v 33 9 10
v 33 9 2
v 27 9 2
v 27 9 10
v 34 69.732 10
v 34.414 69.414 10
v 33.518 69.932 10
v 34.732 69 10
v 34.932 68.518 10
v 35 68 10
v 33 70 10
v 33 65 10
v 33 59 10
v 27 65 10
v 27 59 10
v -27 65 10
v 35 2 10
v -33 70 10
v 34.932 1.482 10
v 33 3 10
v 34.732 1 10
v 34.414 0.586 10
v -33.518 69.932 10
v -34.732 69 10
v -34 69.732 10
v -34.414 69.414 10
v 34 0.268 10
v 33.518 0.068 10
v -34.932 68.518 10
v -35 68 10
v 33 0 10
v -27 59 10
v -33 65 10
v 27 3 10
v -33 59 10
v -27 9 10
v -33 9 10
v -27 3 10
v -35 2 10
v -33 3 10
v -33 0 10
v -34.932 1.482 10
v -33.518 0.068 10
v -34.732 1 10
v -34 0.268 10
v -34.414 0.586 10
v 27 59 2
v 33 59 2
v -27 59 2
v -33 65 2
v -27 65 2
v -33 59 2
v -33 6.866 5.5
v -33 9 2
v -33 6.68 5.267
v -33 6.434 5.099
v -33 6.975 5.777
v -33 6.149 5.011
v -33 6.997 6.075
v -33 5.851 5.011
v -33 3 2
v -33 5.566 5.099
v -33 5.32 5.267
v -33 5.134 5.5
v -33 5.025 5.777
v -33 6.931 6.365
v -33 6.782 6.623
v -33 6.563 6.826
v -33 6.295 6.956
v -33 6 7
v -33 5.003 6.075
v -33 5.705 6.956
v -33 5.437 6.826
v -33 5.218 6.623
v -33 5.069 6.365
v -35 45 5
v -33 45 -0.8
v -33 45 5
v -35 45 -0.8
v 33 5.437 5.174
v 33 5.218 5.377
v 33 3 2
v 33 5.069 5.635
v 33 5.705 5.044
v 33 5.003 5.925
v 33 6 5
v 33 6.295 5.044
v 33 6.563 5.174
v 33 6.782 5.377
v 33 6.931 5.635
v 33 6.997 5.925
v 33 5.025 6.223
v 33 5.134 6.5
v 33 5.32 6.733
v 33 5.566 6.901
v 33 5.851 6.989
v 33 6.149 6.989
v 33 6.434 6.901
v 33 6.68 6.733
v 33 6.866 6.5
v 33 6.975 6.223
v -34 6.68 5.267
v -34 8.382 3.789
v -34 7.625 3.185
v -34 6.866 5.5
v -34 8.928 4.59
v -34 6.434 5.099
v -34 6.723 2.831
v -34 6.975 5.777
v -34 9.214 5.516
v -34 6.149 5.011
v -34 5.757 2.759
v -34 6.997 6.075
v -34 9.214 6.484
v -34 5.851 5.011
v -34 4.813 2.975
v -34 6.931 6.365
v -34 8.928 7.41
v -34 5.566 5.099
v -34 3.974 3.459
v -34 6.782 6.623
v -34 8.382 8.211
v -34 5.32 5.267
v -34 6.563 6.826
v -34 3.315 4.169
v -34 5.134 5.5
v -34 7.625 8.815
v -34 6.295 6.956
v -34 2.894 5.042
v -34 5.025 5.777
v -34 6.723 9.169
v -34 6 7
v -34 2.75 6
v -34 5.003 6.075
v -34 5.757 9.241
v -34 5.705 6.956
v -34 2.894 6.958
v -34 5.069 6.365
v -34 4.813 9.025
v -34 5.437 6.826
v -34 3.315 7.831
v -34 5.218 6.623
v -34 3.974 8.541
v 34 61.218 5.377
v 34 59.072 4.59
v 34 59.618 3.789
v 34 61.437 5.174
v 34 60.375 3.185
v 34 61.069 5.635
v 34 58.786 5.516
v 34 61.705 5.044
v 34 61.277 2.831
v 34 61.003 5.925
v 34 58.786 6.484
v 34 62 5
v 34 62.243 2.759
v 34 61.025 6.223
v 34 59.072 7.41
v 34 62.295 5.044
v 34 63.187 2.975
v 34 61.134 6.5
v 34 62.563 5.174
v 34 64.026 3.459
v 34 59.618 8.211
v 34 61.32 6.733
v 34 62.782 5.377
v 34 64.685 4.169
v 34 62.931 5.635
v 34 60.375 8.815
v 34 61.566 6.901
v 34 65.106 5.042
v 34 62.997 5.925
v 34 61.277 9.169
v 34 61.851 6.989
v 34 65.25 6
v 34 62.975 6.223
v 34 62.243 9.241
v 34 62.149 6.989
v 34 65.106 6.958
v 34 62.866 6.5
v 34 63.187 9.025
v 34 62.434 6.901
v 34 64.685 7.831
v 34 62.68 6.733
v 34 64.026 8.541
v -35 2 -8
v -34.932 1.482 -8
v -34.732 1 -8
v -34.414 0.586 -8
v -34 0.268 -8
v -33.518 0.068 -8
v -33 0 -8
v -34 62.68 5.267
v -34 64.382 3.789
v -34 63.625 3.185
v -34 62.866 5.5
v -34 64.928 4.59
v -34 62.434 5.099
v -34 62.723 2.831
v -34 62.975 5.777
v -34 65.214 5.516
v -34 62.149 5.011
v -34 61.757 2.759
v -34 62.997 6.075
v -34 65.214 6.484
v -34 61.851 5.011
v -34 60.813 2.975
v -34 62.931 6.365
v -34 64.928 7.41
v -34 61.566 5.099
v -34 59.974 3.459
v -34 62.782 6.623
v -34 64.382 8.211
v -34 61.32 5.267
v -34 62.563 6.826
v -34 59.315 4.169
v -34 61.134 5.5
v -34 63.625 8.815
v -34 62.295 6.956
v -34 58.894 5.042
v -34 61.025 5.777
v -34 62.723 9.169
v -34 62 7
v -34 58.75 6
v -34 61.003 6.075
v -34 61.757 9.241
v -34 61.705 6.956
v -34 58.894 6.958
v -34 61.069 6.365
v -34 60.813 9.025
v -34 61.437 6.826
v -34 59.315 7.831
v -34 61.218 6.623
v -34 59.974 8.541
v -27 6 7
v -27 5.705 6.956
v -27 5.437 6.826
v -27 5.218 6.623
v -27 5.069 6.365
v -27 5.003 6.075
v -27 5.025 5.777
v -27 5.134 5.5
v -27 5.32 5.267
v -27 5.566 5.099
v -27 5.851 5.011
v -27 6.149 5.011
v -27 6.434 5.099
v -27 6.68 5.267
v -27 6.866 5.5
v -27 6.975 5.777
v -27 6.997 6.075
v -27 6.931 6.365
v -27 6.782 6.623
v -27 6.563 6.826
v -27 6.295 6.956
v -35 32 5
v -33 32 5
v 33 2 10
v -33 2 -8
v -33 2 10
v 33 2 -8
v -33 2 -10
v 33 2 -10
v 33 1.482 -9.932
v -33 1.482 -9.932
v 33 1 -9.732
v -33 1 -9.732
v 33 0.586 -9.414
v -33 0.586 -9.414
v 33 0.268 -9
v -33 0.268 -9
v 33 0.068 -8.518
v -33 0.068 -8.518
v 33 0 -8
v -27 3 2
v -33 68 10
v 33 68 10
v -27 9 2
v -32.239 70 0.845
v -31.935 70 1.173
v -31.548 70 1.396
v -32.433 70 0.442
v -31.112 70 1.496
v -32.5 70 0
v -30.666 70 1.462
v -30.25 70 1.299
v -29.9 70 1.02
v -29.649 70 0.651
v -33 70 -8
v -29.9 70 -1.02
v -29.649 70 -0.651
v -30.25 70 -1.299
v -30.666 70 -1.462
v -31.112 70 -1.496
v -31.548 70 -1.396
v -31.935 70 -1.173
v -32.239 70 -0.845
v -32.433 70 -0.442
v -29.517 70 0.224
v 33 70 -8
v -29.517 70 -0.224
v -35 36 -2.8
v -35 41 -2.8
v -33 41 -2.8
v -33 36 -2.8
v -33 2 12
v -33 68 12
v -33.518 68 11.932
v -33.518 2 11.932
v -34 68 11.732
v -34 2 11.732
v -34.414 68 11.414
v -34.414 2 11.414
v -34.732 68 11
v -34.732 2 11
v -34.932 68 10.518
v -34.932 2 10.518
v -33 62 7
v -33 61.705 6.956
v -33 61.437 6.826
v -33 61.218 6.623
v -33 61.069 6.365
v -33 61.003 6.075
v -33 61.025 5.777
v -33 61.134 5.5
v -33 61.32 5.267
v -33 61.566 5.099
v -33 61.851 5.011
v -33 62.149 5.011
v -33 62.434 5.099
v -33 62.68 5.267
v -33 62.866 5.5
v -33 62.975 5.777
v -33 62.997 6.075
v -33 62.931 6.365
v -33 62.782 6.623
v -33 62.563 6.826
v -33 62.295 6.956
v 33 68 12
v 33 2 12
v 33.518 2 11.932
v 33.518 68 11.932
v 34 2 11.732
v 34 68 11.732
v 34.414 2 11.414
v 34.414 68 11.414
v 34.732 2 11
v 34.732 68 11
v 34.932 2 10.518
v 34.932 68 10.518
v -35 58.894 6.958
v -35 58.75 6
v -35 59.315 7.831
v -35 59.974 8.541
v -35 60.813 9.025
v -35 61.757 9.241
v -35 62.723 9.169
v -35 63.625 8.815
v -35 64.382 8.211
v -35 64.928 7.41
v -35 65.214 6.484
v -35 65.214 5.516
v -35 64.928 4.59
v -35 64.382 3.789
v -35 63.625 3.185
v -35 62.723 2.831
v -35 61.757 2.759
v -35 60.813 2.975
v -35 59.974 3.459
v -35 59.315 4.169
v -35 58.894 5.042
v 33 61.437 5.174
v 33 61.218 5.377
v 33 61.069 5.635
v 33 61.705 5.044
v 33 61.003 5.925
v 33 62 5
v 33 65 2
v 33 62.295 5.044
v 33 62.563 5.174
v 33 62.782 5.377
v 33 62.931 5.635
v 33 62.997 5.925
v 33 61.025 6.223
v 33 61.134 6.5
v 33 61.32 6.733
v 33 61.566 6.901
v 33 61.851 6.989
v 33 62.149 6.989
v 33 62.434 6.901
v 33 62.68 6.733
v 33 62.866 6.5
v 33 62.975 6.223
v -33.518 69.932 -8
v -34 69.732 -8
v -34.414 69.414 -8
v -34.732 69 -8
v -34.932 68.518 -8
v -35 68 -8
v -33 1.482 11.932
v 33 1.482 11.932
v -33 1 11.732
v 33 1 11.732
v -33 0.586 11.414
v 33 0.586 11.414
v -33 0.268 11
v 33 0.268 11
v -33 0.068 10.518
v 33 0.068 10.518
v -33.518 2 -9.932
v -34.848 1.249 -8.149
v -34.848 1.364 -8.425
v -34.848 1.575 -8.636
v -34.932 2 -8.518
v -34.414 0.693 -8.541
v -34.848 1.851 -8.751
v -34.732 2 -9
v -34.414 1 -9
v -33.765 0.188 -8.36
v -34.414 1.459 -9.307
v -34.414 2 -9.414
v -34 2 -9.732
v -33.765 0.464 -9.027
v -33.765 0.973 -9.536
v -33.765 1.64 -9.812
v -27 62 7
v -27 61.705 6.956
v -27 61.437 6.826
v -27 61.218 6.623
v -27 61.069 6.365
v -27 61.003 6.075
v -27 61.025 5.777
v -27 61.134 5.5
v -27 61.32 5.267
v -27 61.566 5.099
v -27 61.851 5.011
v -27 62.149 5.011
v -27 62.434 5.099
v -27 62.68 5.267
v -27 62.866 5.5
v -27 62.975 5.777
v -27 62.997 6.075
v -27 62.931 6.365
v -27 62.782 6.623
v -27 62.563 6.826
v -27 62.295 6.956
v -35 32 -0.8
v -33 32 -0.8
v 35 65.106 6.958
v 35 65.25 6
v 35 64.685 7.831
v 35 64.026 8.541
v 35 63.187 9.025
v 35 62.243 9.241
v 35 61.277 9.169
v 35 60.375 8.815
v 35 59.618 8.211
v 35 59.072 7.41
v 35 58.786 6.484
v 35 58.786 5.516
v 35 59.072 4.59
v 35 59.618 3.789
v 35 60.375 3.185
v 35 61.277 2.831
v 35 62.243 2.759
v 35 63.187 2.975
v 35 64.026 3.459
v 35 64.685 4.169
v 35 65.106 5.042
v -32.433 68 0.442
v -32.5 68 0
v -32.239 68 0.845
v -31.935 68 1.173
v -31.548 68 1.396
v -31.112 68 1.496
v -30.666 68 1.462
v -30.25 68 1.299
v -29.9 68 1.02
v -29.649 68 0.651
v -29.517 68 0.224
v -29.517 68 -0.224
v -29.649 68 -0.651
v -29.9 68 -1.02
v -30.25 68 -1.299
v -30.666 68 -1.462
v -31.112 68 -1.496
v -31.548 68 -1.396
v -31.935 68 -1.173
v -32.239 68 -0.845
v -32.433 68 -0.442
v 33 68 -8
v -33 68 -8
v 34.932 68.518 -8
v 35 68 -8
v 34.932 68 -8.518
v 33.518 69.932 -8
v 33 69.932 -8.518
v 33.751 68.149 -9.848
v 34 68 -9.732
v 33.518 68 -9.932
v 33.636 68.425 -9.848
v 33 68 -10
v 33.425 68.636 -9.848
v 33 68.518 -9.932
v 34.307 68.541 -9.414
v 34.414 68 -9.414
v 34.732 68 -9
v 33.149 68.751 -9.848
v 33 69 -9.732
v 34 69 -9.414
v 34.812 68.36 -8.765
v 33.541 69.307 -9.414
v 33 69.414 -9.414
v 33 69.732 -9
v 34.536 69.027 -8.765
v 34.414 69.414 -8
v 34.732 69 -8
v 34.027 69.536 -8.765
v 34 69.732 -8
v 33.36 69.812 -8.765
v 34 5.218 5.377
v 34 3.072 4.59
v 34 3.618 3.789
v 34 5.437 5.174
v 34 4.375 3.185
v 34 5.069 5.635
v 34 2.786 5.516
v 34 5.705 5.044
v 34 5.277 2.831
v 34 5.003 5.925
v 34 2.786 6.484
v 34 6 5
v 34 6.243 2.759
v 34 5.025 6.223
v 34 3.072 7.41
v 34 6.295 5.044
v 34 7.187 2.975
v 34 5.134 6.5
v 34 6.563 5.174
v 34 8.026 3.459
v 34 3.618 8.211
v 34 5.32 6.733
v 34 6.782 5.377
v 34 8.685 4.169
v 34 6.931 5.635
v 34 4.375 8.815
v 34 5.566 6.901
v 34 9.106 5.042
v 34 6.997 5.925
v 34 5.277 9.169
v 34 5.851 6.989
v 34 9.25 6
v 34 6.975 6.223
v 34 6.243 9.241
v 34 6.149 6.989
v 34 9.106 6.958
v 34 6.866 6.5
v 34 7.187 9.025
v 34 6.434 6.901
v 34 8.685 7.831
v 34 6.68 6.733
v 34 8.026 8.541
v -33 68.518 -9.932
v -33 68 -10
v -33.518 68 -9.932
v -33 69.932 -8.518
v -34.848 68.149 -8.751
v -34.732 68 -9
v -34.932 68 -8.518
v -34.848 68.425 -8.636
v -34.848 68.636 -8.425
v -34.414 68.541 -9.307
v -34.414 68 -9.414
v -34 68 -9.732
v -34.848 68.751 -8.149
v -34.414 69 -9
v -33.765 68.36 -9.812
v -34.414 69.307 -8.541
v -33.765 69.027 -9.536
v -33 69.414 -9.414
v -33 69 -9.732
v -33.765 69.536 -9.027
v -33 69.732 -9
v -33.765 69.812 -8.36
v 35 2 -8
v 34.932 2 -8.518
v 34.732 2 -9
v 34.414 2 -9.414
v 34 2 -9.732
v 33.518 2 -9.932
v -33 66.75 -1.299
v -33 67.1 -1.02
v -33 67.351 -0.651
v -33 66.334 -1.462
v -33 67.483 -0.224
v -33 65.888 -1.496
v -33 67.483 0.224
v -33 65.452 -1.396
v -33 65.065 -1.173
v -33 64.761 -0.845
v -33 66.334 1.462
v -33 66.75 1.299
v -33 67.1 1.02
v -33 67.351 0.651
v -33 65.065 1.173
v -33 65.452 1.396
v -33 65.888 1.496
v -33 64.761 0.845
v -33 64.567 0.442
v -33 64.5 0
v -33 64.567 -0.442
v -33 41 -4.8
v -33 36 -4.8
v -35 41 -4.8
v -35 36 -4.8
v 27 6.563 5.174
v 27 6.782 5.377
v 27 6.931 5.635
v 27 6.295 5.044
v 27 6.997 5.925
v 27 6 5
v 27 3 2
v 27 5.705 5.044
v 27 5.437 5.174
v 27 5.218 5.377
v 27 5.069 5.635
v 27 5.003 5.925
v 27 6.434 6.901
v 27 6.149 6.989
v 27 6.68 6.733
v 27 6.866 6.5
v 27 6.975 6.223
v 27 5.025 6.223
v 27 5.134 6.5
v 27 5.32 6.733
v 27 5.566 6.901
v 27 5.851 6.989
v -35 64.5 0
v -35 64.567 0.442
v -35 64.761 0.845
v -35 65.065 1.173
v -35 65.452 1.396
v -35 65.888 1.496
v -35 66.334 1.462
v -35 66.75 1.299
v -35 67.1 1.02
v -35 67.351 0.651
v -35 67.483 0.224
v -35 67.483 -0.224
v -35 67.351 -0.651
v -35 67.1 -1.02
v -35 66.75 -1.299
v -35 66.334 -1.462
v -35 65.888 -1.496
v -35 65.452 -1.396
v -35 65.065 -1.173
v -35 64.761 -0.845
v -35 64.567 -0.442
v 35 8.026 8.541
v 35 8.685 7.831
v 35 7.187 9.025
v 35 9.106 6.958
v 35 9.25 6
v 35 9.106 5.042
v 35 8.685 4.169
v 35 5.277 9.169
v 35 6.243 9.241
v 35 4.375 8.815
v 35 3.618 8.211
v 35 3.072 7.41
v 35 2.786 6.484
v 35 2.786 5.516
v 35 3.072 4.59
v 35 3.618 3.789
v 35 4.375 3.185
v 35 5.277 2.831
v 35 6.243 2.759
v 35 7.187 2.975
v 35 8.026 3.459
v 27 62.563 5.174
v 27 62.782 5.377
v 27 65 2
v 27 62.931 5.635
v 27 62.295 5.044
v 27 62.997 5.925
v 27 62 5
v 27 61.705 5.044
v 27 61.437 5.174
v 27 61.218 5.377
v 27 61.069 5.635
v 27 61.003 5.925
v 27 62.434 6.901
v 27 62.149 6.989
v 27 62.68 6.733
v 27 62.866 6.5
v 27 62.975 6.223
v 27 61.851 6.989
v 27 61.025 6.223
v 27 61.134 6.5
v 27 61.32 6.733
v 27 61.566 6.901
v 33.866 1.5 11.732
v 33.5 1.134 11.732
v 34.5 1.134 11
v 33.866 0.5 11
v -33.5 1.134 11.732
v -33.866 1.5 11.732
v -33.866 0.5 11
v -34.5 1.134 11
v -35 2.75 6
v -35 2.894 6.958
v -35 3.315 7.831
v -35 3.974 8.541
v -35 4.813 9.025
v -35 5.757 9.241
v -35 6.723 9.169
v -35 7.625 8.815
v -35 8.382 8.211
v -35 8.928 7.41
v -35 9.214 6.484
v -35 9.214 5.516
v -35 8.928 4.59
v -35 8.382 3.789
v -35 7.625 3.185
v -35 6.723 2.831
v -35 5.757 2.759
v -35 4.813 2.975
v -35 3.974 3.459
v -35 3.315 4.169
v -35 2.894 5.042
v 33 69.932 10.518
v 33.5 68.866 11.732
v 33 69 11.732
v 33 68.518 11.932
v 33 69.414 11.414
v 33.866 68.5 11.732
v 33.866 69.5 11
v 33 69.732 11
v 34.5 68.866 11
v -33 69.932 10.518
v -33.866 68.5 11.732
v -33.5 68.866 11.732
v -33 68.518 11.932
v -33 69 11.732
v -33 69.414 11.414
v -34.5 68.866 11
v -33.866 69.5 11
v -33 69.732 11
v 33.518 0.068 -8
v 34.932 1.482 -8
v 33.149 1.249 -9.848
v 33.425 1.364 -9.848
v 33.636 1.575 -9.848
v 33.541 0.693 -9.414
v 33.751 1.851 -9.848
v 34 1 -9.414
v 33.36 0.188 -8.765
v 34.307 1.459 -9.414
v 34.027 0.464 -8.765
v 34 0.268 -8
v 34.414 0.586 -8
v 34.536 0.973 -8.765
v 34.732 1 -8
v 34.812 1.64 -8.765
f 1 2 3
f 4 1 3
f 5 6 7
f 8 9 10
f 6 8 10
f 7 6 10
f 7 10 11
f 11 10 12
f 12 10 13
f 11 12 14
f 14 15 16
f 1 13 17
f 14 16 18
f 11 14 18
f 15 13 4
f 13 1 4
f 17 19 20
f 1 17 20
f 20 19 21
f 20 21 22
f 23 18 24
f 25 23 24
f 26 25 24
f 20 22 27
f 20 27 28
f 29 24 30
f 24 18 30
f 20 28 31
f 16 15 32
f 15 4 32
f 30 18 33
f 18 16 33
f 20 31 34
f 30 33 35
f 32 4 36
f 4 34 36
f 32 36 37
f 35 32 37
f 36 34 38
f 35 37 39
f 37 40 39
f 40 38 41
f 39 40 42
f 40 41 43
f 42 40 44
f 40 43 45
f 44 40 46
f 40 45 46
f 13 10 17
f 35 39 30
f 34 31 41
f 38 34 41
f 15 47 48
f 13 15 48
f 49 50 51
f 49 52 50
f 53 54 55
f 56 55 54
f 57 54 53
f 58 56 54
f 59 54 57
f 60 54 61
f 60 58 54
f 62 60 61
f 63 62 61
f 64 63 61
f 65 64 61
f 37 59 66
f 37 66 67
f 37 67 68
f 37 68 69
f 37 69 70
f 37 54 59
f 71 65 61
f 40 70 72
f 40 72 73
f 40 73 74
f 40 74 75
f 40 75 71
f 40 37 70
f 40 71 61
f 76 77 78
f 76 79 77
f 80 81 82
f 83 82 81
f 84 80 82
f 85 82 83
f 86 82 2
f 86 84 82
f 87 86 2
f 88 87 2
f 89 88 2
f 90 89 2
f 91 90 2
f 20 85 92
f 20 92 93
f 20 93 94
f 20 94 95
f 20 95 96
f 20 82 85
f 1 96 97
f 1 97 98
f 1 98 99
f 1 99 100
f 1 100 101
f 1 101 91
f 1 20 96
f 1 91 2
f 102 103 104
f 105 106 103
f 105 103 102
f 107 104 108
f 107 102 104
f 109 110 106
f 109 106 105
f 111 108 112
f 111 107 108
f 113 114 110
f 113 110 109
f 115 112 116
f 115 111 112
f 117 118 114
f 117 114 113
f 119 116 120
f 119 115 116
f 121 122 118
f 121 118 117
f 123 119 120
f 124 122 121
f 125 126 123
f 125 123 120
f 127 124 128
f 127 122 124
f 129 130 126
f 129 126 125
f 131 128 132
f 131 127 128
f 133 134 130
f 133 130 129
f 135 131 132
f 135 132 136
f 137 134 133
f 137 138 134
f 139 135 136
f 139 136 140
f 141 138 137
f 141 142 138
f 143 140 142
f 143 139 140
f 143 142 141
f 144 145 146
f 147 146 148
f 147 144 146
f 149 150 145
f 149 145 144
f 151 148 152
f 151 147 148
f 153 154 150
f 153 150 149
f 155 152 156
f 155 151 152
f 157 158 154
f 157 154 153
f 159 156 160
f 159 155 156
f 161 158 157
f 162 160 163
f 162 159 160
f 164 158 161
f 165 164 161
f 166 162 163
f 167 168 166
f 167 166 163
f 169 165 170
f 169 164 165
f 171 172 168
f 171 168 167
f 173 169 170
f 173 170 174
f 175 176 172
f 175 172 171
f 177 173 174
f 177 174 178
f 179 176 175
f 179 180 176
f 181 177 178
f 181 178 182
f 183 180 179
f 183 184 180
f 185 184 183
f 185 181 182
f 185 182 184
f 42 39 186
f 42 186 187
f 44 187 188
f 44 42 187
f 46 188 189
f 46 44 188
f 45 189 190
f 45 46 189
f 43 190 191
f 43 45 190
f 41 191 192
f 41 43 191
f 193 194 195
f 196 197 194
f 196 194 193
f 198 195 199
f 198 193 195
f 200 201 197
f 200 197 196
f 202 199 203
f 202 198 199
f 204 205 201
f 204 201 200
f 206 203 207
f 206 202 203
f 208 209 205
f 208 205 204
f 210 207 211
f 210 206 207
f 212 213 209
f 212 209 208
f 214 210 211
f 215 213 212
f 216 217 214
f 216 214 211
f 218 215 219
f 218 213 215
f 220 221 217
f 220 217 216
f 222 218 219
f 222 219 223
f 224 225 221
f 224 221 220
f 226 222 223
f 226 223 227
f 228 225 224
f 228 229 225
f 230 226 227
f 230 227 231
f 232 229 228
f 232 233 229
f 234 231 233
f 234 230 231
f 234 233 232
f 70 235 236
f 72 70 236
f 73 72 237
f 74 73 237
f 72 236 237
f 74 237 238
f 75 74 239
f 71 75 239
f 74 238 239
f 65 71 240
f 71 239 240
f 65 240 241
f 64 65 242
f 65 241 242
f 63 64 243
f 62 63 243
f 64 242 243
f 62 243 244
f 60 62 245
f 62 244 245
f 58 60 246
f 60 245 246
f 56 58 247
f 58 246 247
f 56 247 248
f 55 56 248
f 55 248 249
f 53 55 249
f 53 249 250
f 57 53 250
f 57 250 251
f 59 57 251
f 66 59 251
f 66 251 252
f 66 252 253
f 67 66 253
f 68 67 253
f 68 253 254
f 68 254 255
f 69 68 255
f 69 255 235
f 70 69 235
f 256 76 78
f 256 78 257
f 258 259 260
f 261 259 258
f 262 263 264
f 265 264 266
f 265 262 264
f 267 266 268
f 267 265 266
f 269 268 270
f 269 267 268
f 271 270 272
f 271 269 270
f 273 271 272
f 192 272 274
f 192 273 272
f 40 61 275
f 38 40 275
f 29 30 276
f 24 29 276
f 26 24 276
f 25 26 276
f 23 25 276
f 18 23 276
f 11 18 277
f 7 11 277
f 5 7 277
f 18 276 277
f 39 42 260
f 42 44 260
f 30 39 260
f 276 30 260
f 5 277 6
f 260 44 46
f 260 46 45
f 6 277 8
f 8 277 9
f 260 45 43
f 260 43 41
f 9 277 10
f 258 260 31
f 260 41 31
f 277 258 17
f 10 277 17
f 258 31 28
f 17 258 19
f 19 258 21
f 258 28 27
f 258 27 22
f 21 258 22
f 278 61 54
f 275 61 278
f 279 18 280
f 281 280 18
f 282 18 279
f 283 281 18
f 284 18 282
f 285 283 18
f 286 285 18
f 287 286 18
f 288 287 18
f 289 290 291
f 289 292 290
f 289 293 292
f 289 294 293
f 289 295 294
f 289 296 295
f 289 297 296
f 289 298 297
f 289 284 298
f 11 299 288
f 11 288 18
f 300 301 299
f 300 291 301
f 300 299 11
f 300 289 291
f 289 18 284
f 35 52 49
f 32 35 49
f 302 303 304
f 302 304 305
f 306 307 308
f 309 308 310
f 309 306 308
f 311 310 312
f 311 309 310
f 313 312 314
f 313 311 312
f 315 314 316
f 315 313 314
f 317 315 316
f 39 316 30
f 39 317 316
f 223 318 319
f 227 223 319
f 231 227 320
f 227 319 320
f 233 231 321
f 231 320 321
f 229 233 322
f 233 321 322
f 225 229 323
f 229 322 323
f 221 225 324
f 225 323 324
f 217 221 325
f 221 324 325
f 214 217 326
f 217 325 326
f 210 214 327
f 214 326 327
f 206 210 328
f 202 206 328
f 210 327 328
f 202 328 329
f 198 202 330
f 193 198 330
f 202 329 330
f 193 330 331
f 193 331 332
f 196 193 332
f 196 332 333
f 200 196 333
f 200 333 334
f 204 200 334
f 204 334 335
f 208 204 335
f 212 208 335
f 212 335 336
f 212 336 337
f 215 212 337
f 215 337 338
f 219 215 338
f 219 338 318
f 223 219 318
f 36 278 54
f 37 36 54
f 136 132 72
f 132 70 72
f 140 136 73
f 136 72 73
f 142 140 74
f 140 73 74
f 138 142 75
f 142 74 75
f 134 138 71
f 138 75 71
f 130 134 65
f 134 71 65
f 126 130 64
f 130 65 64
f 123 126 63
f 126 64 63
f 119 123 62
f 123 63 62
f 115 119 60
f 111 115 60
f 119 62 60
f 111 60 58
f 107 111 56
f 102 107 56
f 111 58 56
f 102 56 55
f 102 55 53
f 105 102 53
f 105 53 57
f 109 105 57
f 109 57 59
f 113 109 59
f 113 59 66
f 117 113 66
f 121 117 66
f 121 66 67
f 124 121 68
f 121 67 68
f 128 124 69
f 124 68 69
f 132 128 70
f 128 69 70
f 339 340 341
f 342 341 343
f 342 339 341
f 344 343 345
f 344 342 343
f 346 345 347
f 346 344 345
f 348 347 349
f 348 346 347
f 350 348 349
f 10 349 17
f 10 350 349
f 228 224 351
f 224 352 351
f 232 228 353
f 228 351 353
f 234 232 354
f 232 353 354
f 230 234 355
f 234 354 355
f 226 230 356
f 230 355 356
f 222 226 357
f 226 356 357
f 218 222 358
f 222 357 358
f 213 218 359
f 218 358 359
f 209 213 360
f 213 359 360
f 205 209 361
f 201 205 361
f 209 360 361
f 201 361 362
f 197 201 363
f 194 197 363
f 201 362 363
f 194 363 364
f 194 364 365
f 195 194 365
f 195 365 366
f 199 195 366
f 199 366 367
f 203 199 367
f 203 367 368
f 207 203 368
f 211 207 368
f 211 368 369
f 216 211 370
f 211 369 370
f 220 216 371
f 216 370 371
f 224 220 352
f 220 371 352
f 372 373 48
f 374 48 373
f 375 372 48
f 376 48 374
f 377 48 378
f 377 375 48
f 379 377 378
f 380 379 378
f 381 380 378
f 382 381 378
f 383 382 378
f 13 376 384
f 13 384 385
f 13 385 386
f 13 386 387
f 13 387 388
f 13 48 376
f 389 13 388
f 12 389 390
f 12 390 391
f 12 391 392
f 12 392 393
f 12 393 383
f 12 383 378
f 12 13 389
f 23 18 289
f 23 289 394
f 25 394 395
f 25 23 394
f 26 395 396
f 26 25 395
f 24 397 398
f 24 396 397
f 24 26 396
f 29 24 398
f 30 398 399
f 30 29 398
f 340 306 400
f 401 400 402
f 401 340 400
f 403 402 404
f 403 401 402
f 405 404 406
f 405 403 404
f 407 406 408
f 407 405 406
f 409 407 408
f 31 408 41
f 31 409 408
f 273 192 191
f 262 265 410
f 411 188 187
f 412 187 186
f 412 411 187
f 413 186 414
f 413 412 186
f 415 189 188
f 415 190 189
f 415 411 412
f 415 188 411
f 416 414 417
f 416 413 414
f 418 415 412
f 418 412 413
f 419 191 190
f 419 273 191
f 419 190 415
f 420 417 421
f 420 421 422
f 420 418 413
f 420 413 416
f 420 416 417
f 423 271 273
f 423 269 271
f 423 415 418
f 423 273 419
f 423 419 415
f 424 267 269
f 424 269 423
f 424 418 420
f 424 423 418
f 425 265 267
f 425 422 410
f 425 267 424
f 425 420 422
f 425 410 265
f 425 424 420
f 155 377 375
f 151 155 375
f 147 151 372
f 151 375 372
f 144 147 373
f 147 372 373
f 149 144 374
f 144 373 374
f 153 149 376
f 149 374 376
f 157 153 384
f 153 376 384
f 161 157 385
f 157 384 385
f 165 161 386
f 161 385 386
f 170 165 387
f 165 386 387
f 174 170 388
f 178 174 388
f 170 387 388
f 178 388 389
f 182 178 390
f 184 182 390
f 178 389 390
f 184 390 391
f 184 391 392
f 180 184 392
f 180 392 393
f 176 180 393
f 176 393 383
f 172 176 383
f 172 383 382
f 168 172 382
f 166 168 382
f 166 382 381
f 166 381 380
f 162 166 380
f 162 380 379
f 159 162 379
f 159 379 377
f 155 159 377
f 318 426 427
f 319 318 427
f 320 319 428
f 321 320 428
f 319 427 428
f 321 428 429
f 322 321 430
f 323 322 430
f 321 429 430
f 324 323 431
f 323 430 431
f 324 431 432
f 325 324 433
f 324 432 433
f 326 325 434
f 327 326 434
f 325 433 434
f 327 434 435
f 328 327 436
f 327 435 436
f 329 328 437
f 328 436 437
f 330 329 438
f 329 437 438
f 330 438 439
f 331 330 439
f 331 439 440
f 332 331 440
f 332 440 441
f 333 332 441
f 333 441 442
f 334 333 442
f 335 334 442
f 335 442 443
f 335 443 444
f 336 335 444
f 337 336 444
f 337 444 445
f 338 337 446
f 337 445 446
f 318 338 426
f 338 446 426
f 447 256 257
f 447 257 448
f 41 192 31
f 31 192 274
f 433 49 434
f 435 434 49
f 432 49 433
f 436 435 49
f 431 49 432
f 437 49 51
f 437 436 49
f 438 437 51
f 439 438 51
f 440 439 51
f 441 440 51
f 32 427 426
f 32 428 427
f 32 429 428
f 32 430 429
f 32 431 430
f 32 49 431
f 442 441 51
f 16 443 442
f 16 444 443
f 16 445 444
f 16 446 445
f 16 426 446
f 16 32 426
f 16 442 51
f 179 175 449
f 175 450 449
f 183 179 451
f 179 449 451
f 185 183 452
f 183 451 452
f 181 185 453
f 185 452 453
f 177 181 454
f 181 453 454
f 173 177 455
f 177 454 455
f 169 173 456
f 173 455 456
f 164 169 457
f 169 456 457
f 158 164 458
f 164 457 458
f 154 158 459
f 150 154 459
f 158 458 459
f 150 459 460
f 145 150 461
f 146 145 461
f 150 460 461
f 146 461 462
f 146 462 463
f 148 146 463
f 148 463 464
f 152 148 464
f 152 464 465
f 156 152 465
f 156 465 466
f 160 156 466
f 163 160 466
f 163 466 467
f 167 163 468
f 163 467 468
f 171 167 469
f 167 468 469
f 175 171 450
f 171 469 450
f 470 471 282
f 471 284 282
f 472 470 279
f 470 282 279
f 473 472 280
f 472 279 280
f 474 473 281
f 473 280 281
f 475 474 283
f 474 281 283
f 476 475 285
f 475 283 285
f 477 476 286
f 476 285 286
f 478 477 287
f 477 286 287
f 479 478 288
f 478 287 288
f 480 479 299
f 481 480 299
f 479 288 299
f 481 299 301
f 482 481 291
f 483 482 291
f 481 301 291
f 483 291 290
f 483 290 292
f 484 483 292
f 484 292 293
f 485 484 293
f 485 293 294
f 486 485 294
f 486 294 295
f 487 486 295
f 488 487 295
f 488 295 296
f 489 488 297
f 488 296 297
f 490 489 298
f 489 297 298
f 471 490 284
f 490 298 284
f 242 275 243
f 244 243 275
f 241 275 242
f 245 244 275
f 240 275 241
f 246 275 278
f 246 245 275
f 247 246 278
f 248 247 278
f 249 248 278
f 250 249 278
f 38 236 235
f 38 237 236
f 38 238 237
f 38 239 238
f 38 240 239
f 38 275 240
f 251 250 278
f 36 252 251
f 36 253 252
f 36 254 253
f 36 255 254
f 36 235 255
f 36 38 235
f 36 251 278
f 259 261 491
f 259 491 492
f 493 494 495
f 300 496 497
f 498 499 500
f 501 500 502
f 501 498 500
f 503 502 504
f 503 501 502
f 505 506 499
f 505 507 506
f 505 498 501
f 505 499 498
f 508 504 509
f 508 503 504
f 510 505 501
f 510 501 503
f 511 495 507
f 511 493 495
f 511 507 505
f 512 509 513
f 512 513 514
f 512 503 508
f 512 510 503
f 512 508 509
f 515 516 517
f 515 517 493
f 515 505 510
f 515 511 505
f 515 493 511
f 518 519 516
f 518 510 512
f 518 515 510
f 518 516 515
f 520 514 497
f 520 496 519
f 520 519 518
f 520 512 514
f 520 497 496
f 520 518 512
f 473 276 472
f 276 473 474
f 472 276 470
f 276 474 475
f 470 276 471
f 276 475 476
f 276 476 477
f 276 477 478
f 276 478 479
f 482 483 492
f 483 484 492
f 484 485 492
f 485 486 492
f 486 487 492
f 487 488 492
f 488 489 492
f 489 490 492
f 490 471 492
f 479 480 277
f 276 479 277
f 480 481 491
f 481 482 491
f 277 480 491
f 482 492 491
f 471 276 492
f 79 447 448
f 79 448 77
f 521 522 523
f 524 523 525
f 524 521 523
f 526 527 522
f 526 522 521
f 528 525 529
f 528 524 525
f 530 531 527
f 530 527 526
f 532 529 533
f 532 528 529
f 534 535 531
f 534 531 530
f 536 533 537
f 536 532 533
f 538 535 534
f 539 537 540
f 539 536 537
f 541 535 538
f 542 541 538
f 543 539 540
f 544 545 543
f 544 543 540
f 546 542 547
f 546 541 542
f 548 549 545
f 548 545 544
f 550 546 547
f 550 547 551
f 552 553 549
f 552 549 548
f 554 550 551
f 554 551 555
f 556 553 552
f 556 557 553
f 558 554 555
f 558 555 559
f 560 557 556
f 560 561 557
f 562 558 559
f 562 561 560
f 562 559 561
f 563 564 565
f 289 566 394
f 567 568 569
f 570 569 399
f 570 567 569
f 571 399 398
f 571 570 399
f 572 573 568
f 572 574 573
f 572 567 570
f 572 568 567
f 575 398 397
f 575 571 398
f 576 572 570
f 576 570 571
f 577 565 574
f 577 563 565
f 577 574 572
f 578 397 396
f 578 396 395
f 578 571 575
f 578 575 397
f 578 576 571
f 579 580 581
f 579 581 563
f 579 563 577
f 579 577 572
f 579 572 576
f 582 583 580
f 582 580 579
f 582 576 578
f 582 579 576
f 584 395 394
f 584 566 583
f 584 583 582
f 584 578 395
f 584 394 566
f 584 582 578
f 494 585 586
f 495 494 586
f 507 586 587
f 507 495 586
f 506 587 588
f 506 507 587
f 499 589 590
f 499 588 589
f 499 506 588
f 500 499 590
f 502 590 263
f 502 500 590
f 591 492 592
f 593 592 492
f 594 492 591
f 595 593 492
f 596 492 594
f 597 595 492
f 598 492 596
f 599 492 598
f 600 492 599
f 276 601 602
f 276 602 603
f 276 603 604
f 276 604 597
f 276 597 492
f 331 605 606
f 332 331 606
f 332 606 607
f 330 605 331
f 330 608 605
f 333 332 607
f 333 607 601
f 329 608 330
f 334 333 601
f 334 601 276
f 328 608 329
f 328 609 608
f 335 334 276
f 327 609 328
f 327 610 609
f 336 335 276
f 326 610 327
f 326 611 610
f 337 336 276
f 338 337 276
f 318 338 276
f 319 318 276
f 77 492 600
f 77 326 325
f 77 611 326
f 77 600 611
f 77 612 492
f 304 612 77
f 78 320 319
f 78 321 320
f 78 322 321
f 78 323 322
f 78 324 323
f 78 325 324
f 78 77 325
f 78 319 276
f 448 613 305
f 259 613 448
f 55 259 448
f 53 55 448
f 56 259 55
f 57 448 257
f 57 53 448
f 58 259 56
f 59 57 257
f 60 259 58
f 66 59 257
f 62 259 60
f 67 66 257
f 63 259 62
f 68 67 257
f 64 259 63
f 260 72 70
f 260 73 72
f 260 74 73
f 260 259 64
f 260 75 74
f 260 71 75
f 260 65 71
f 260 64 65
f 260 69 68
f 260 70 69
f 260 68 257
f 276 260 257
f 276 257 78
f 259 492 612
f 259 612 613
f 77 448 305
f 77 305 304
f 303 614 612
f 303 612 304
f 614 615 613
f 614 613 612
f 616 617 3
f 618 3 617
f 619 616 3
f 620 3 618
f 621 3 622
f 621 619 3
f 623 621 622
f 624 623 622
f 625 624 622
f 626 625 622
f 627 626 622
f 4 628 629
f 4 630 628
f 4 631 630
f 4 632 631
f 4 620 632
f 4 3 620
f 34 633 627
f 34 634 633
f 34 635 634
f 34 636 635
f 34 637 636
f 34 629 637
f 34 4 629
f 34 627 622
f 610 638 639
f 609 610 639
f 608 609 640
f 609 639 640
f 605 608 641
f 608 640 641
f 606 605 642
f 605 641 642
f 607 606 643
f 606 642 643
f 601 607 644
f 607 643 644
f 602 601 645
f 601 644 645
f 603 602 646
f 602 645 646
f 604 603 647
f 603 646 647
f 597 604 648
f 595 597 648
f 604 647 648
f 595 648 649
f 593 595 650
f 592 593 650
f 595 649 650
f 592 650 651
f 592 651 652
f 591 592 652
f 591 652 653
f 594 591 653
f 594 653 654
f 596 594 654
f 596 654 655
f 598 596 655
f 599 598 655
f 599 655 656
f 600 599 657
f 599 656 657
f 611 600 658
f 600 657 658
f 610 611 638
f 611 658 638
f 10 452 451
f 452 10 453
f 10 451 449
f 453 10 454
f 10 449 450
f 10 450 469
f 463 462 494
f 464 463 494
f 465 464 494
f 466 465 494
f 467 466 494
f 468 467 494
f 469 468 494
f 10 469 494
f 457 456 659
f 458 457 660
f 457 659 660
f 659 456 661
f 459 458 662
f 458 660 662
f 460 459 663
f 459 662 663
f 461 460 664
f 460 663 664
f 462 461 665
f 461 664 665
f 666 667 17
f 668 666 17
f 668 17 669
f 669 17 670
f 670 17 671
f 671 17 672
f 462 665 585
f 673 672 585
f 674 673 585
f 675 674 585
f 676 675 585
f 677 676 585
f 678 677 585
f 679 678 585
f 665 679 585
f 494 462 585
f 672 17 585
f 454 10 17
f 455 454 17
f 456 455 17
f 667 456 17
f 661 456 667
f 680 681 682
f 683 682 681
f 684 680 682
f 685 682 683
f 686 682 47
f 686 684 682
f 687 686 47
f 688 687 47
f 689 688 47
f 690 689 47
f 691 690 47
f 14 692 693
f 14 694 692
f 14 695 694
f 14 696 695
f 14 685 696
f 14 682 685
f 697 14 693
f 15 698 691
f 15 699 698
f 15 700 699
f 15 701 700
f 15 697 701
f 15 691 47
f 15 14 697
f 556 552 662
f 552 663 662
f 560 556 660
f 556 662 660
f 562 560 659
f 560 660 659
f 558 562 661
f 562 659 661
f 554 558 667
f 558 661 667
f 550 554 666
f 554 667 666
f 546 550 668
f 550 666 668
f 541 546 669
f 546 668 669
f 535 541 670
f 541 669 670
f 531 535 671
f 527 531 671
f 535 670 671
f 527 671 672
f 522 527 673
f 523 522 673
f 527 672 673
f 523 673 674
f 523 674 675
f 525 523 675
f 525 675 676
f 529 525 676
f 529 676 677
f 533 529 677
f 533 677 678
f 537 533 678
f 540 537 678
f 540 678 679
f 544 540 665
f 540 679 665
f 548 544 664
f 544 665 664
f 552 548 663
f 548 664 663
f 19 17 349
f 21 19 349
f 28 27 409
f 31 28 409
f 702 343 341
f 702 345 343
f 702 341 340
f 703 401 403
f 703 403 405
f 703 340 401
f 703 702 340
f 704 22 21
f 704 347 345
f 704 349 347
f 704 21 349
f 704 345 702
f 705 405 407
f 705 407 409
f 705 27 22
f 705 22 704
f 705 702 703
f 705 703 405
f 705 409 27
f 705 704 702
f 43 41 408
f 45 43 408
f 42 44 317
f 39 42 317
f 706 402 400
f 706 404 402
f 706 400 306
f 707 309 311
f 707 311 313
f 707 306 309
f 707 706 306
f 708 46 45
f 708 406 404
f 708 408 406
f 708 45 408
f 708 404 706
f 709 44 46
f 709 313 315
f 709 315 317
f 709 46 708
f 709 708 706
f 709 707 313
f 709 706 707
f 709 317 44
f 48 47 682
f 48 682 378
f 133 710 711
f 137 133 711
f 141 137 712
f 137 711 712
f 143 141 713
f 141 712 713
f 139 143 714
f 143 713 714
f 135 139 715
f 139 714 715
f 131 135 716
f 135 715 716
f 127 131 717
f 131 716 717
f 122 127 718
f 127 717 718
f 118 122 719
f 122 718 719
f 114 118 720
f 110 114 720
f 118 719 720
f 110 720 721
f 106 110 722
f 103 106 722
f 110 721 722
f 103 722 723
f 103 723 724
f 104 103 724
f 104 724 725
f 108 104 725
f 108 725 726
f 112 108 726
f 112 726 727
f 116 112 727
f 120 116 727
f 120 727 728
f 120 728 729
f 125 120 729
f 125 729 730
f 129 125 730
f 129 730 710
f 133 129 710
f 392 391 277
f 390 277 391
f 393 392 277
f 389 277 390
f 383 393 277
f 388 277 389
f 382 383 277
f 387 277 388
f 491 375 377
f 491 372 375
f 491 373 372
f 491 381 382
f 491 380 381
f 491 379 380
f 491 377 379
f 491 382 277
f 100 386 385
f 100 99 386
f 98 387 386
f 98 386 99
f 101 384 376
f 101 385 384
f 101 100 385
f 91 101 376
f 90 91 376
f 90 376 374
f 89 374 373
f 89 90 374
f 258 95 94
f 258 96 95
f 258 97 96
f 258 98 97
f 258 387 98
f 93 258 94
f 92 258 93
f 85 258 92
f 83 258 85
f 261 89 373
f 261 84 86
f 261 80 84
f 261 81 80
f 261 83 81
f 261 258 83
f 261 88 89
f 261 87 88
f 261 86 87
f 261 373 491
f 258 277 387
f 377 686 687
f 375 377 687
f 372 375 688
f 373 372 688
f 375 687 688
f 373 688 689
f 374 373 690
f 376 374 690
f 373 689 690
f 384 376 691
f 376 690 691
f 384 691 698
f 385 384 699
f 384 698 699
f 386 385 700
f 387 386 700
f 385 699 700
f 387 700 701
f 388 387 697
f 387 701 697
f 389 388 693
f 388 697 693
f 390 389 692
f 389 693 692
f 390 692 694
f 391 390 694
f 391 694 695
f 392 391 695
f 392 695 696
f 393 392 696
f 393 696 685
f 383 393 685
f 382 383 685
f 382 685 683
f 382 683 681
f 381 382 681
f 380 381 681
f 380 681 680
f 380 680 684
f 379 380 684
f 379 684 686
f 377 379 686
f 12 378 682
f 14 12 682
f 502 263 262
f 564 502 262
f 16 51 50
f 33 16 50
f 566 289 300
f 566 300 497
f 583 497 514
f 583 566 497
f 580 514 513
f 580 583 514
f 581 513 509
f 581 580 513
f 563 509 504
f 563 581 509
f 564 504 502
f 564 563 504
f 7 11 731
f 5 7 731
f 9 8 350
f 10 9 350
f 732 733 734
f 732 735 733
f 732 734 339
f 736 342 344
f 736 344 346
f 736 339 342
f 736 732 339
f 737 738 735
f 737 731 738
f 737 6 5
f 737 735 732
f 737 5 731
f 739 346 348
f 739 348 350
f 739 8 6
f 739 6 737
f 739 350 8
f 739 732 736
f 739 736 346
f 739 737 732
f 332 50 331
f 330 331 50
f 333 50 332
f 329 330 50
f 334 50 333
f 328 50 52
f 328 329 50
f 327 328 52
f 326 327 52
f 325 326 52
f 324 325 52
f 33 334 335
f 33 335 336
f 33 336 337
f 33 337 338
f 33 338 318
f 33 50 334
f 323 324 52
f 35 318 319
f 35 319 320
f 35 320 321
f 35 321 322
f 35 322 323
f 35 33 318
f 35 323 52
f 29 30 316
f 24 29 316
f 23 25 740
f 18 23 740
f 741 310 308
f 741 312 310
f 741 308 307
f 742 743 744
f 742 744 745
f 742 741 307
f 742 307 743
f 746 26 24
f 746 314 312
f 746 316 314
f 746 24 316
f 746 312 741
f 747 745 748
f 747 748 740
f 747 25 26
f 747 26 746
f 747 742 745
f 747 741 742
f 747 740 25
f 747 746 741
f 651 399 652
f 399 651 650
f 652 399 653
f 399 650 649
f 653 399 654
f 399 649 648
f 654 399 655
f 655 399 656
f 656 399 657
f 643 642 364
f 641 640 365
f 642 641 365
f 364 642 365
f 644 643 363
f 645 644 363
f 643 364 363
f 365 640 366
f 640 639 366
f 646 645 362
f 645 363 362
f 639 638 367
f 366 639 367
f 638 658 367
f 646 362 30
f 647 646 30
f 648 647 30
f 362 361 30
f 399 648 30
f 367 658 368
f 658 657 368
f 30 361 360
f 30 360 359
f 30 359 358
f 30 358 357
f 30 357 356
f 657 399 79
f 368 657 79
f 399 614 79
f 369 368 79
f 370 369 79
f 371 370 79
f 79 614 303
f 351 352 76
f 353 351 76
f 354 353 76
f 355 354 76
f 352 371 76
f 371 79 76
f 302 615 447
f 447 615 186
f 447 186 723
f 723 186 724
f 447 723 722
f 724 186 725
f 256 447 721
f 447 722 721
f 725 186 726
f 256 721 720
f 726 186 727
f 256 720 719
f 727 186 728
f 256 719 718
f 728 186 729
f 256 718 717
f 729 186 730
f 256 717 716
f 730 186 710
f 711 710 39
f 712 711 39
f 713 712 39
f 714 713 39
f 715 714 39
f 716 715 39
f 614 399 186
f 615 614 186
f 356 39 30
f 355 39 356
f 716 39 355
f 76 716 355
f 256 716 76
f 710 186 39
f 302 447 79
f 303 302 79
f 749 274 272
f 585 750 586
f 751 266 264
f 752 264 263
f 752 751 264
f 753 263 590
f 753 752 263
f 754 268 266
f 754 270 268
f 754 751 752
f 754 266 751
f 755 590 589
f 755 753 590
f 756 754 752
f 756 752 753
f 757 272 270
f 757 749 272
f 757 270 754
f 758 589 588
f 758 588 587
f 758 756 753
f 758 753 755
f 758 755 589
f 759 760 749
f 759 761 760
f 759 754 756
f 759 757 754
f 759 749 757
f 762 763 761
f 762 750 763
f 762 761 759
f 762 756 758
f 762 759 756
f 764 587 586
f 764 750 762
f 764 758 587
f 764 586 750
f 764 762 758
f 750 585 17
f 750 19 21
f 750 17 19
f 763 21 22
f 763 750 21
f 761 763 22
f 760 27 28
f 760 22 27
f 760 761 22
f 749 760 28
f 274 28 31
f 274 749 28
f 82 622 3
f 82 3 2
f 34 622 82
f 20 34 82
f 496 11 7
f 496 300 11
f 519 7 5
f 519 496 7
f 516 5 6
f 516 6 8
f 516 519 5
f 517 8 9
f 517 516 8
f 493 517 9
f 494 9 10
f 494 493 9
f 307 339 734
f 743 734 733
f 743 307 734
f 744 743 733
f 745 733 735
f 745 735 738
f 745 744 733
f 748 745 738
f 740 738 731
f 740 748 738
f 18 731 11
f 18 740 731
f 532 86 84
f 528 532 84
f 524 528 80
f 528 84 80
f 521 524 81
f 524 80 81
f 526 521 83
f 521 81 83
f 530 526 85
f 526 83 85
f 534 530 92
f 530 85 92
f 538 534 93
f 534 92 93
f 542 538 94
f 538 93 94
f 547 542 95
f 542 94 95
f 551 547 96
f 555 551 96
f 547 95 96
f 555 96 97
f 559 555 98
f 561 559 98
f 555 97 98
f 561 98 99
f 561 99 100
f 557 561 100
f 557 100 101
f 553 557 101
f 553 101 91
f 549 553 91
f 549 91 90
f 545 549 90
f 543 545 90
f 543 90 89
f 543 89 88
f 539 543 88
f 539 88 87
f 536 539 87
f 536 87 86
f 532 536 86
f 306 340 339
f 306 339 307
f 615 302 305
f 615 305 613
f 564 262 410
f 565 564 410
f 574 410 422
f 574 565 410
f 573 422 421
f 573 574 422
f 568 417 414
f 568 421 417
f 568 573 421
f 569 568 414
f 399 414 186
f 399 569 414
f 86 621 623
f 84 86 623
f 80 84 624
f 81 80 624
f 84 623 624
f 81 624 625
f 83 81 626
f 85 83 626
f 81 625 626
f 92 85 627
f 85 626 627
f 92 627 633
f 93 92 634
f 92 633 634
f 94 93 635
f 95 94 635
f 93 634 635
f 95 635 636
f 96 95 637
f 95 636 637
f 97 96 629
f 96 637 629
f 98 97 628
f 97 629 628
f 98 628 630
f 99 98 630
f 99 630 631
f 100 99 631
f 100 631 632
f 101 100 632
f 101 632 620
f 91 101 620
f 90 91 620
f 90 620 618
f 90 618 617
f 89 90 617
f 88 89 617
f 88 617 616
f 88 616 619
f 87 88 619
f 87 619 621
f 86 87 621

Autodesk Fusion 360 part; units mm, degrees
sketch "Sketch1" plane through (0, 0, 0) normal (0, 1, 0) x (1, 0, 0) in component "Case"
  line L0 (-35, -10) -> (35, -10)
  line L1 (35, -10) -> (35, 10)
  line L2 (35, 10) -> (-35, 10)
  line L3 (-35, 10) -> (-35, -10)
  dimension "d1" = 70
  dimension "d2" = 20
  dimension "d4" = 35
  dimension "d5" = 10
extrude "Extrude1" add sketch "Sketch1" along normal blind 70 makes body 1 in component "Case"
shell "Shell1" thickness 2 removed faces 1 at (-11.6667, 23.3333, 10) on bodies 1 in component "Case"
sketch "Sketch2" plane through (-35, 0, 0) normal (-1, 0, 0) x (0, -1, 0) in component "Case"
  line L0 (0, -10) -> (0, 10)
  line L1 (0, 10) -> (-70, 10)
  line L2 (-70, 10) -> (-70, -10)
  line L3 (-70, -10) -> (0, -10)
  circle A0 centre (-66, 0) radius 1.5
  circle A1 centre (-6, 6) radius 3.25
  circle A2 centre (-62, 6) radius 3.25
  line L4 (-45, 5) -> (-32, 5)
  line L5 (-32, 5) -> (-32, -0.8)
  line L6 (-32, -0.8) -> (-45, -0.8)
  line L7 (-45, -0.8) -> (-45, 5)
  line L8 (-41, -2.8) -> (-36, -2.8)
  line L9 (-36, -2.8) -> (-36, -4.8)
  line L10 (-36, -4.8) -> (-41, -4.8)
  line L11 (-41, -4.8) -> (-41, -2.8)
  dimension "d9" = 3
  dimension "d10" = 4
  dimension "d11" = 10
  dimension "d12" = 6.5
  dimension "d14" = 6
  dimension "d15" = 6.5
  dimension "d16" = 8
  dimension "d17" = 4
  dimension "d29" = 13
  dimension "d30" = 5.8
  dimension "d31" = 5
  dimension "d32" = 2
  dimension "d33" = 5
  dimension "d34" = 25
  dimension "d35" = 2
  dimension "d36" = 4
  dimension "d87" = 4
hole "Hole2" at (-35, 6, 6) direction (1, 0, 0) diameter 2 depth 6 tip angle 118 bodies 1 in component "Case"
hole "Hole1" at (-35, 62, 6) direction (1, 0, 0) diameter 2 depth 6 tip angle 118 bodies 1 in component "Case"
extrude "Extrude2" cut sketch "Sketch2" against normal blind 1 contours A1 | A2 bodies 1 in component "Case"
extrude "Extrude3" cut sketch "Sketch2" against normal blind 6 contours A0 | L4 L5 L6 L7 | L8 L9 L10 L11 bodies 1 in component "Case"
sketch "Sketch3" plane through (0, 70, 0) normal (0, 1, 0) x (-1, 0, 0) in component "Case"
  line L0 (35, -10) -> (35, 10)
  line L1 (35, 10) -> (-35, 10)
  line L2 (-35, 10) -> (-35, -10)
  line L3 (-35, -10) -> (35, -10)
  circle A0 centre (31, 0) radius 1.5
  point P0 (35, 10)
  dimension "d39" = 3
  dimension "d40" = 4
  dimension "d41" = 10
extrude "Extrude4" cut sketch "Sketch3" against normal blind 6 contours A0 bodies 1 in component "Case"
sketch "Sketch4" plane through (35, 0, 0) normal (1, 0, 0) x (0, 1, 0) in component "Case"
  line L0 (0, 10) -> (0, -10)
  line L1 (0, -10) -> (70, -10)
  line L2 (70, -10) -> (70, 10)
  line L3 (70, 10) -> (0, 10)
  circle A0 centre (6, 6) radius 3.25
  circle A1 centre (62, 6) radius 3.25
  dimension "d44" = 6.5
  dimension "d45" = 6
  dimension "d46" = 4
  dimension "d47" = 6.5
  dimension "d48" = 8
  dimension "d49" = 4
hole "Hole5" at (35, 62, 6) direction (-1, 0, 0) diameter 2 depth 6 tip angle 118 bodies 1 in component "Case"
hole "Hole4" at (35, 6, 6) direction (-1, 0, 0) diameter 2 depth 6 tip angle 118 bodies 1 in component "Case"
extrude "Extrude5" cut sketch "Sketch4" against normal blind 1 contours A0 | A1 bodies 1 in component "Case"
fillet "Fillet1" radius 2 8 edges at (35, 0, 0) (0, 0, -10) (-35, 0, 0) (35, 70, 0) (0, 70, -10) (-35, 70, 0) (-35, 35, -10) (35, 35, -10) on bodies 1 in component "Case"
sketch "Sketch1 (2)" plane through (0, 0, 10) normal (0, 0, 1) x (-1, 0, 0) in component "Top"
  arc A0 (-33, 0) -> (-35, -2) centre (-33, -2) ccw
  line L0 (-35, -2) -> (-35, -68)
  arc A1 (-35, -68) -> (-33, -70) centre (-33, -68) ccw
  line L1 (-33, -70) -> (33, -70)
  arc A2 (33, -70) -> (35, -68) centre (33, -68) ccw
  line L2 (35, -68) -> (35, -2)
  arc A3 (35, -2) -> (33, 0) centre (33, -2) ccw
  line L3 (33, 0) -> (-33, 0)
  line L4 (33, -2) -> (33, -68)
  line L5 (33, -68) -> (-33, -68)
  line L6 (-33, -68) -> (-33, -2)
  line L7 (-33, -2) -> (33, -2)
  line L8 (33, -2) -> (-33, -2)
  line L9 (-33, -2) -> (-33, -68)
  line L10 (-33, -68) -> (33, -68)
  line L11 (33, -68) -> (33, -2)
extrude "Extrude1'" add sketch "Sketch1 (2)" along normal blind 2 separate body contours A0 L0 A1 L1 A2 L2 A3 L3 | L4 L5 L6 L7 L8 L9 L10 L11 makes body 2 in component "Top"
sketch "Sketch2 (2)" plane through (0, 0, 10) normal (0, 0, -1) x (1, 0, 0) in component "Top"
  line L0 (33, 0) -> (-33, 0)
  arc A0 (-33, 0) -> (-35, -2) centre (-33, -2) ccw
  line L1 (-35, -2) -> (-35, -68)
  arc A1 (-35, -68) -> (-33, -70) centre (-33, -68) ccw
  line L2 (-33, -70) -> (33, -70)
  arc A2 (33, -70) -> (35, -68) centre (33, -68) ccw
  line L3 (35, -68) -> (35, -2)
  arc A3 (35, -2) -> (33, 0) centre (33, -2) ccw
  line L4 (-33, -3) -> (-27, -3)
  line L5 (-27, -3) -> (-27, -9)
  line L6 (-27, -9) -> (-33, -9)
  line L7 (-33, -9) -> (-33, -3)
  line L8 (27, -3) -> (33, -3)
  line L9 (33, -3) -> (33, -9)
  line L10 (33, -9) -> (27, -9)
  line L11 (27, -9) -> (27, -3)
  line L12 (-33, -59) -> (-27, -59)
  line L13 (-27, -59) -> (-27, -65)
  line L14 (-27, -65) -> (-33, -65)
  line L15 (-33, -65) -> (-33, -59)
  line L16 (33, -62) -> (33, -68)
  line L17 (33, -68) -> (27, -68)
  line L18 (33, -65) -> (27, -65)
  line L19 (27, -65) -> (27, -59)
  line L20 (27, -59) -> (33, -59)
  line L21 (33, -59) -> (33, -65)
  dimension "d61" = 6
  dimension "d62" = 6
  dimension "d63" = 6
  dimension "d64" = 6
  dimension "d65" = 6
  dimension "d66" = 6
  dimension "d69" = 2
  dimension "d71" = 2
  dimension "d72" = 2
  dimension "d73" = 3
  dimension "d75" = 3
  dimension "d78" = 5
  dimension "d82" = 6
  dimension "d83" = 5
  dimension "d84" = 2
extrude "Extrude2'" add sketch "Sketch2 (2)" along normal blind 8 contours L4 L5 L6 L7 | L8 L9 L10 L11 | L12 L13 L14 L15 | L16 L18 L19 L20 L21 bodies 2 in component "Top"
hole "Hole1'" at (-33, 62, 6) direction (1, 0, 0) diameter 2 depth 6 tip angle 118 bodies 2 in component "Top"
hole "Hole2'" at (-33, 6, 6) direction (1, 0, 0) diameter 2 depth 6 tip angle 118 bodies 2 in component "Top"
hole "Hole3" at (33, 6, 6) direction (-1, 0, 0) diameter 2 depth 6 tip angle 118 bodies 2 in component "Top"
hole "Hole4'" at (33, 62, 6) direction (-1, 0, 0) diameter 2 depth 6 tip angle 118 bodies 2 in component "Top"
fillet "Fillet1'" radius 2 8 edges at (0, 70, 12) (-34.4142, 69.4142, 12) (-35, 35, 12) (-34.4142, 0.5858, 12) (0, 0, 12) (34.4142, 0.5858, 12) (35, 35, 12) (34.4142, 69.4142, 12) on bodies 2 in component "Top"
component "Case" placed x (1, 0, 0) y (0, 1, 0) z (0, 0, 1) at (0, 0, 0)
component "Top" placed x (1, 0, 0) y (0, 1, 0) z (0, 0, 1) at (0, 0, 0)
